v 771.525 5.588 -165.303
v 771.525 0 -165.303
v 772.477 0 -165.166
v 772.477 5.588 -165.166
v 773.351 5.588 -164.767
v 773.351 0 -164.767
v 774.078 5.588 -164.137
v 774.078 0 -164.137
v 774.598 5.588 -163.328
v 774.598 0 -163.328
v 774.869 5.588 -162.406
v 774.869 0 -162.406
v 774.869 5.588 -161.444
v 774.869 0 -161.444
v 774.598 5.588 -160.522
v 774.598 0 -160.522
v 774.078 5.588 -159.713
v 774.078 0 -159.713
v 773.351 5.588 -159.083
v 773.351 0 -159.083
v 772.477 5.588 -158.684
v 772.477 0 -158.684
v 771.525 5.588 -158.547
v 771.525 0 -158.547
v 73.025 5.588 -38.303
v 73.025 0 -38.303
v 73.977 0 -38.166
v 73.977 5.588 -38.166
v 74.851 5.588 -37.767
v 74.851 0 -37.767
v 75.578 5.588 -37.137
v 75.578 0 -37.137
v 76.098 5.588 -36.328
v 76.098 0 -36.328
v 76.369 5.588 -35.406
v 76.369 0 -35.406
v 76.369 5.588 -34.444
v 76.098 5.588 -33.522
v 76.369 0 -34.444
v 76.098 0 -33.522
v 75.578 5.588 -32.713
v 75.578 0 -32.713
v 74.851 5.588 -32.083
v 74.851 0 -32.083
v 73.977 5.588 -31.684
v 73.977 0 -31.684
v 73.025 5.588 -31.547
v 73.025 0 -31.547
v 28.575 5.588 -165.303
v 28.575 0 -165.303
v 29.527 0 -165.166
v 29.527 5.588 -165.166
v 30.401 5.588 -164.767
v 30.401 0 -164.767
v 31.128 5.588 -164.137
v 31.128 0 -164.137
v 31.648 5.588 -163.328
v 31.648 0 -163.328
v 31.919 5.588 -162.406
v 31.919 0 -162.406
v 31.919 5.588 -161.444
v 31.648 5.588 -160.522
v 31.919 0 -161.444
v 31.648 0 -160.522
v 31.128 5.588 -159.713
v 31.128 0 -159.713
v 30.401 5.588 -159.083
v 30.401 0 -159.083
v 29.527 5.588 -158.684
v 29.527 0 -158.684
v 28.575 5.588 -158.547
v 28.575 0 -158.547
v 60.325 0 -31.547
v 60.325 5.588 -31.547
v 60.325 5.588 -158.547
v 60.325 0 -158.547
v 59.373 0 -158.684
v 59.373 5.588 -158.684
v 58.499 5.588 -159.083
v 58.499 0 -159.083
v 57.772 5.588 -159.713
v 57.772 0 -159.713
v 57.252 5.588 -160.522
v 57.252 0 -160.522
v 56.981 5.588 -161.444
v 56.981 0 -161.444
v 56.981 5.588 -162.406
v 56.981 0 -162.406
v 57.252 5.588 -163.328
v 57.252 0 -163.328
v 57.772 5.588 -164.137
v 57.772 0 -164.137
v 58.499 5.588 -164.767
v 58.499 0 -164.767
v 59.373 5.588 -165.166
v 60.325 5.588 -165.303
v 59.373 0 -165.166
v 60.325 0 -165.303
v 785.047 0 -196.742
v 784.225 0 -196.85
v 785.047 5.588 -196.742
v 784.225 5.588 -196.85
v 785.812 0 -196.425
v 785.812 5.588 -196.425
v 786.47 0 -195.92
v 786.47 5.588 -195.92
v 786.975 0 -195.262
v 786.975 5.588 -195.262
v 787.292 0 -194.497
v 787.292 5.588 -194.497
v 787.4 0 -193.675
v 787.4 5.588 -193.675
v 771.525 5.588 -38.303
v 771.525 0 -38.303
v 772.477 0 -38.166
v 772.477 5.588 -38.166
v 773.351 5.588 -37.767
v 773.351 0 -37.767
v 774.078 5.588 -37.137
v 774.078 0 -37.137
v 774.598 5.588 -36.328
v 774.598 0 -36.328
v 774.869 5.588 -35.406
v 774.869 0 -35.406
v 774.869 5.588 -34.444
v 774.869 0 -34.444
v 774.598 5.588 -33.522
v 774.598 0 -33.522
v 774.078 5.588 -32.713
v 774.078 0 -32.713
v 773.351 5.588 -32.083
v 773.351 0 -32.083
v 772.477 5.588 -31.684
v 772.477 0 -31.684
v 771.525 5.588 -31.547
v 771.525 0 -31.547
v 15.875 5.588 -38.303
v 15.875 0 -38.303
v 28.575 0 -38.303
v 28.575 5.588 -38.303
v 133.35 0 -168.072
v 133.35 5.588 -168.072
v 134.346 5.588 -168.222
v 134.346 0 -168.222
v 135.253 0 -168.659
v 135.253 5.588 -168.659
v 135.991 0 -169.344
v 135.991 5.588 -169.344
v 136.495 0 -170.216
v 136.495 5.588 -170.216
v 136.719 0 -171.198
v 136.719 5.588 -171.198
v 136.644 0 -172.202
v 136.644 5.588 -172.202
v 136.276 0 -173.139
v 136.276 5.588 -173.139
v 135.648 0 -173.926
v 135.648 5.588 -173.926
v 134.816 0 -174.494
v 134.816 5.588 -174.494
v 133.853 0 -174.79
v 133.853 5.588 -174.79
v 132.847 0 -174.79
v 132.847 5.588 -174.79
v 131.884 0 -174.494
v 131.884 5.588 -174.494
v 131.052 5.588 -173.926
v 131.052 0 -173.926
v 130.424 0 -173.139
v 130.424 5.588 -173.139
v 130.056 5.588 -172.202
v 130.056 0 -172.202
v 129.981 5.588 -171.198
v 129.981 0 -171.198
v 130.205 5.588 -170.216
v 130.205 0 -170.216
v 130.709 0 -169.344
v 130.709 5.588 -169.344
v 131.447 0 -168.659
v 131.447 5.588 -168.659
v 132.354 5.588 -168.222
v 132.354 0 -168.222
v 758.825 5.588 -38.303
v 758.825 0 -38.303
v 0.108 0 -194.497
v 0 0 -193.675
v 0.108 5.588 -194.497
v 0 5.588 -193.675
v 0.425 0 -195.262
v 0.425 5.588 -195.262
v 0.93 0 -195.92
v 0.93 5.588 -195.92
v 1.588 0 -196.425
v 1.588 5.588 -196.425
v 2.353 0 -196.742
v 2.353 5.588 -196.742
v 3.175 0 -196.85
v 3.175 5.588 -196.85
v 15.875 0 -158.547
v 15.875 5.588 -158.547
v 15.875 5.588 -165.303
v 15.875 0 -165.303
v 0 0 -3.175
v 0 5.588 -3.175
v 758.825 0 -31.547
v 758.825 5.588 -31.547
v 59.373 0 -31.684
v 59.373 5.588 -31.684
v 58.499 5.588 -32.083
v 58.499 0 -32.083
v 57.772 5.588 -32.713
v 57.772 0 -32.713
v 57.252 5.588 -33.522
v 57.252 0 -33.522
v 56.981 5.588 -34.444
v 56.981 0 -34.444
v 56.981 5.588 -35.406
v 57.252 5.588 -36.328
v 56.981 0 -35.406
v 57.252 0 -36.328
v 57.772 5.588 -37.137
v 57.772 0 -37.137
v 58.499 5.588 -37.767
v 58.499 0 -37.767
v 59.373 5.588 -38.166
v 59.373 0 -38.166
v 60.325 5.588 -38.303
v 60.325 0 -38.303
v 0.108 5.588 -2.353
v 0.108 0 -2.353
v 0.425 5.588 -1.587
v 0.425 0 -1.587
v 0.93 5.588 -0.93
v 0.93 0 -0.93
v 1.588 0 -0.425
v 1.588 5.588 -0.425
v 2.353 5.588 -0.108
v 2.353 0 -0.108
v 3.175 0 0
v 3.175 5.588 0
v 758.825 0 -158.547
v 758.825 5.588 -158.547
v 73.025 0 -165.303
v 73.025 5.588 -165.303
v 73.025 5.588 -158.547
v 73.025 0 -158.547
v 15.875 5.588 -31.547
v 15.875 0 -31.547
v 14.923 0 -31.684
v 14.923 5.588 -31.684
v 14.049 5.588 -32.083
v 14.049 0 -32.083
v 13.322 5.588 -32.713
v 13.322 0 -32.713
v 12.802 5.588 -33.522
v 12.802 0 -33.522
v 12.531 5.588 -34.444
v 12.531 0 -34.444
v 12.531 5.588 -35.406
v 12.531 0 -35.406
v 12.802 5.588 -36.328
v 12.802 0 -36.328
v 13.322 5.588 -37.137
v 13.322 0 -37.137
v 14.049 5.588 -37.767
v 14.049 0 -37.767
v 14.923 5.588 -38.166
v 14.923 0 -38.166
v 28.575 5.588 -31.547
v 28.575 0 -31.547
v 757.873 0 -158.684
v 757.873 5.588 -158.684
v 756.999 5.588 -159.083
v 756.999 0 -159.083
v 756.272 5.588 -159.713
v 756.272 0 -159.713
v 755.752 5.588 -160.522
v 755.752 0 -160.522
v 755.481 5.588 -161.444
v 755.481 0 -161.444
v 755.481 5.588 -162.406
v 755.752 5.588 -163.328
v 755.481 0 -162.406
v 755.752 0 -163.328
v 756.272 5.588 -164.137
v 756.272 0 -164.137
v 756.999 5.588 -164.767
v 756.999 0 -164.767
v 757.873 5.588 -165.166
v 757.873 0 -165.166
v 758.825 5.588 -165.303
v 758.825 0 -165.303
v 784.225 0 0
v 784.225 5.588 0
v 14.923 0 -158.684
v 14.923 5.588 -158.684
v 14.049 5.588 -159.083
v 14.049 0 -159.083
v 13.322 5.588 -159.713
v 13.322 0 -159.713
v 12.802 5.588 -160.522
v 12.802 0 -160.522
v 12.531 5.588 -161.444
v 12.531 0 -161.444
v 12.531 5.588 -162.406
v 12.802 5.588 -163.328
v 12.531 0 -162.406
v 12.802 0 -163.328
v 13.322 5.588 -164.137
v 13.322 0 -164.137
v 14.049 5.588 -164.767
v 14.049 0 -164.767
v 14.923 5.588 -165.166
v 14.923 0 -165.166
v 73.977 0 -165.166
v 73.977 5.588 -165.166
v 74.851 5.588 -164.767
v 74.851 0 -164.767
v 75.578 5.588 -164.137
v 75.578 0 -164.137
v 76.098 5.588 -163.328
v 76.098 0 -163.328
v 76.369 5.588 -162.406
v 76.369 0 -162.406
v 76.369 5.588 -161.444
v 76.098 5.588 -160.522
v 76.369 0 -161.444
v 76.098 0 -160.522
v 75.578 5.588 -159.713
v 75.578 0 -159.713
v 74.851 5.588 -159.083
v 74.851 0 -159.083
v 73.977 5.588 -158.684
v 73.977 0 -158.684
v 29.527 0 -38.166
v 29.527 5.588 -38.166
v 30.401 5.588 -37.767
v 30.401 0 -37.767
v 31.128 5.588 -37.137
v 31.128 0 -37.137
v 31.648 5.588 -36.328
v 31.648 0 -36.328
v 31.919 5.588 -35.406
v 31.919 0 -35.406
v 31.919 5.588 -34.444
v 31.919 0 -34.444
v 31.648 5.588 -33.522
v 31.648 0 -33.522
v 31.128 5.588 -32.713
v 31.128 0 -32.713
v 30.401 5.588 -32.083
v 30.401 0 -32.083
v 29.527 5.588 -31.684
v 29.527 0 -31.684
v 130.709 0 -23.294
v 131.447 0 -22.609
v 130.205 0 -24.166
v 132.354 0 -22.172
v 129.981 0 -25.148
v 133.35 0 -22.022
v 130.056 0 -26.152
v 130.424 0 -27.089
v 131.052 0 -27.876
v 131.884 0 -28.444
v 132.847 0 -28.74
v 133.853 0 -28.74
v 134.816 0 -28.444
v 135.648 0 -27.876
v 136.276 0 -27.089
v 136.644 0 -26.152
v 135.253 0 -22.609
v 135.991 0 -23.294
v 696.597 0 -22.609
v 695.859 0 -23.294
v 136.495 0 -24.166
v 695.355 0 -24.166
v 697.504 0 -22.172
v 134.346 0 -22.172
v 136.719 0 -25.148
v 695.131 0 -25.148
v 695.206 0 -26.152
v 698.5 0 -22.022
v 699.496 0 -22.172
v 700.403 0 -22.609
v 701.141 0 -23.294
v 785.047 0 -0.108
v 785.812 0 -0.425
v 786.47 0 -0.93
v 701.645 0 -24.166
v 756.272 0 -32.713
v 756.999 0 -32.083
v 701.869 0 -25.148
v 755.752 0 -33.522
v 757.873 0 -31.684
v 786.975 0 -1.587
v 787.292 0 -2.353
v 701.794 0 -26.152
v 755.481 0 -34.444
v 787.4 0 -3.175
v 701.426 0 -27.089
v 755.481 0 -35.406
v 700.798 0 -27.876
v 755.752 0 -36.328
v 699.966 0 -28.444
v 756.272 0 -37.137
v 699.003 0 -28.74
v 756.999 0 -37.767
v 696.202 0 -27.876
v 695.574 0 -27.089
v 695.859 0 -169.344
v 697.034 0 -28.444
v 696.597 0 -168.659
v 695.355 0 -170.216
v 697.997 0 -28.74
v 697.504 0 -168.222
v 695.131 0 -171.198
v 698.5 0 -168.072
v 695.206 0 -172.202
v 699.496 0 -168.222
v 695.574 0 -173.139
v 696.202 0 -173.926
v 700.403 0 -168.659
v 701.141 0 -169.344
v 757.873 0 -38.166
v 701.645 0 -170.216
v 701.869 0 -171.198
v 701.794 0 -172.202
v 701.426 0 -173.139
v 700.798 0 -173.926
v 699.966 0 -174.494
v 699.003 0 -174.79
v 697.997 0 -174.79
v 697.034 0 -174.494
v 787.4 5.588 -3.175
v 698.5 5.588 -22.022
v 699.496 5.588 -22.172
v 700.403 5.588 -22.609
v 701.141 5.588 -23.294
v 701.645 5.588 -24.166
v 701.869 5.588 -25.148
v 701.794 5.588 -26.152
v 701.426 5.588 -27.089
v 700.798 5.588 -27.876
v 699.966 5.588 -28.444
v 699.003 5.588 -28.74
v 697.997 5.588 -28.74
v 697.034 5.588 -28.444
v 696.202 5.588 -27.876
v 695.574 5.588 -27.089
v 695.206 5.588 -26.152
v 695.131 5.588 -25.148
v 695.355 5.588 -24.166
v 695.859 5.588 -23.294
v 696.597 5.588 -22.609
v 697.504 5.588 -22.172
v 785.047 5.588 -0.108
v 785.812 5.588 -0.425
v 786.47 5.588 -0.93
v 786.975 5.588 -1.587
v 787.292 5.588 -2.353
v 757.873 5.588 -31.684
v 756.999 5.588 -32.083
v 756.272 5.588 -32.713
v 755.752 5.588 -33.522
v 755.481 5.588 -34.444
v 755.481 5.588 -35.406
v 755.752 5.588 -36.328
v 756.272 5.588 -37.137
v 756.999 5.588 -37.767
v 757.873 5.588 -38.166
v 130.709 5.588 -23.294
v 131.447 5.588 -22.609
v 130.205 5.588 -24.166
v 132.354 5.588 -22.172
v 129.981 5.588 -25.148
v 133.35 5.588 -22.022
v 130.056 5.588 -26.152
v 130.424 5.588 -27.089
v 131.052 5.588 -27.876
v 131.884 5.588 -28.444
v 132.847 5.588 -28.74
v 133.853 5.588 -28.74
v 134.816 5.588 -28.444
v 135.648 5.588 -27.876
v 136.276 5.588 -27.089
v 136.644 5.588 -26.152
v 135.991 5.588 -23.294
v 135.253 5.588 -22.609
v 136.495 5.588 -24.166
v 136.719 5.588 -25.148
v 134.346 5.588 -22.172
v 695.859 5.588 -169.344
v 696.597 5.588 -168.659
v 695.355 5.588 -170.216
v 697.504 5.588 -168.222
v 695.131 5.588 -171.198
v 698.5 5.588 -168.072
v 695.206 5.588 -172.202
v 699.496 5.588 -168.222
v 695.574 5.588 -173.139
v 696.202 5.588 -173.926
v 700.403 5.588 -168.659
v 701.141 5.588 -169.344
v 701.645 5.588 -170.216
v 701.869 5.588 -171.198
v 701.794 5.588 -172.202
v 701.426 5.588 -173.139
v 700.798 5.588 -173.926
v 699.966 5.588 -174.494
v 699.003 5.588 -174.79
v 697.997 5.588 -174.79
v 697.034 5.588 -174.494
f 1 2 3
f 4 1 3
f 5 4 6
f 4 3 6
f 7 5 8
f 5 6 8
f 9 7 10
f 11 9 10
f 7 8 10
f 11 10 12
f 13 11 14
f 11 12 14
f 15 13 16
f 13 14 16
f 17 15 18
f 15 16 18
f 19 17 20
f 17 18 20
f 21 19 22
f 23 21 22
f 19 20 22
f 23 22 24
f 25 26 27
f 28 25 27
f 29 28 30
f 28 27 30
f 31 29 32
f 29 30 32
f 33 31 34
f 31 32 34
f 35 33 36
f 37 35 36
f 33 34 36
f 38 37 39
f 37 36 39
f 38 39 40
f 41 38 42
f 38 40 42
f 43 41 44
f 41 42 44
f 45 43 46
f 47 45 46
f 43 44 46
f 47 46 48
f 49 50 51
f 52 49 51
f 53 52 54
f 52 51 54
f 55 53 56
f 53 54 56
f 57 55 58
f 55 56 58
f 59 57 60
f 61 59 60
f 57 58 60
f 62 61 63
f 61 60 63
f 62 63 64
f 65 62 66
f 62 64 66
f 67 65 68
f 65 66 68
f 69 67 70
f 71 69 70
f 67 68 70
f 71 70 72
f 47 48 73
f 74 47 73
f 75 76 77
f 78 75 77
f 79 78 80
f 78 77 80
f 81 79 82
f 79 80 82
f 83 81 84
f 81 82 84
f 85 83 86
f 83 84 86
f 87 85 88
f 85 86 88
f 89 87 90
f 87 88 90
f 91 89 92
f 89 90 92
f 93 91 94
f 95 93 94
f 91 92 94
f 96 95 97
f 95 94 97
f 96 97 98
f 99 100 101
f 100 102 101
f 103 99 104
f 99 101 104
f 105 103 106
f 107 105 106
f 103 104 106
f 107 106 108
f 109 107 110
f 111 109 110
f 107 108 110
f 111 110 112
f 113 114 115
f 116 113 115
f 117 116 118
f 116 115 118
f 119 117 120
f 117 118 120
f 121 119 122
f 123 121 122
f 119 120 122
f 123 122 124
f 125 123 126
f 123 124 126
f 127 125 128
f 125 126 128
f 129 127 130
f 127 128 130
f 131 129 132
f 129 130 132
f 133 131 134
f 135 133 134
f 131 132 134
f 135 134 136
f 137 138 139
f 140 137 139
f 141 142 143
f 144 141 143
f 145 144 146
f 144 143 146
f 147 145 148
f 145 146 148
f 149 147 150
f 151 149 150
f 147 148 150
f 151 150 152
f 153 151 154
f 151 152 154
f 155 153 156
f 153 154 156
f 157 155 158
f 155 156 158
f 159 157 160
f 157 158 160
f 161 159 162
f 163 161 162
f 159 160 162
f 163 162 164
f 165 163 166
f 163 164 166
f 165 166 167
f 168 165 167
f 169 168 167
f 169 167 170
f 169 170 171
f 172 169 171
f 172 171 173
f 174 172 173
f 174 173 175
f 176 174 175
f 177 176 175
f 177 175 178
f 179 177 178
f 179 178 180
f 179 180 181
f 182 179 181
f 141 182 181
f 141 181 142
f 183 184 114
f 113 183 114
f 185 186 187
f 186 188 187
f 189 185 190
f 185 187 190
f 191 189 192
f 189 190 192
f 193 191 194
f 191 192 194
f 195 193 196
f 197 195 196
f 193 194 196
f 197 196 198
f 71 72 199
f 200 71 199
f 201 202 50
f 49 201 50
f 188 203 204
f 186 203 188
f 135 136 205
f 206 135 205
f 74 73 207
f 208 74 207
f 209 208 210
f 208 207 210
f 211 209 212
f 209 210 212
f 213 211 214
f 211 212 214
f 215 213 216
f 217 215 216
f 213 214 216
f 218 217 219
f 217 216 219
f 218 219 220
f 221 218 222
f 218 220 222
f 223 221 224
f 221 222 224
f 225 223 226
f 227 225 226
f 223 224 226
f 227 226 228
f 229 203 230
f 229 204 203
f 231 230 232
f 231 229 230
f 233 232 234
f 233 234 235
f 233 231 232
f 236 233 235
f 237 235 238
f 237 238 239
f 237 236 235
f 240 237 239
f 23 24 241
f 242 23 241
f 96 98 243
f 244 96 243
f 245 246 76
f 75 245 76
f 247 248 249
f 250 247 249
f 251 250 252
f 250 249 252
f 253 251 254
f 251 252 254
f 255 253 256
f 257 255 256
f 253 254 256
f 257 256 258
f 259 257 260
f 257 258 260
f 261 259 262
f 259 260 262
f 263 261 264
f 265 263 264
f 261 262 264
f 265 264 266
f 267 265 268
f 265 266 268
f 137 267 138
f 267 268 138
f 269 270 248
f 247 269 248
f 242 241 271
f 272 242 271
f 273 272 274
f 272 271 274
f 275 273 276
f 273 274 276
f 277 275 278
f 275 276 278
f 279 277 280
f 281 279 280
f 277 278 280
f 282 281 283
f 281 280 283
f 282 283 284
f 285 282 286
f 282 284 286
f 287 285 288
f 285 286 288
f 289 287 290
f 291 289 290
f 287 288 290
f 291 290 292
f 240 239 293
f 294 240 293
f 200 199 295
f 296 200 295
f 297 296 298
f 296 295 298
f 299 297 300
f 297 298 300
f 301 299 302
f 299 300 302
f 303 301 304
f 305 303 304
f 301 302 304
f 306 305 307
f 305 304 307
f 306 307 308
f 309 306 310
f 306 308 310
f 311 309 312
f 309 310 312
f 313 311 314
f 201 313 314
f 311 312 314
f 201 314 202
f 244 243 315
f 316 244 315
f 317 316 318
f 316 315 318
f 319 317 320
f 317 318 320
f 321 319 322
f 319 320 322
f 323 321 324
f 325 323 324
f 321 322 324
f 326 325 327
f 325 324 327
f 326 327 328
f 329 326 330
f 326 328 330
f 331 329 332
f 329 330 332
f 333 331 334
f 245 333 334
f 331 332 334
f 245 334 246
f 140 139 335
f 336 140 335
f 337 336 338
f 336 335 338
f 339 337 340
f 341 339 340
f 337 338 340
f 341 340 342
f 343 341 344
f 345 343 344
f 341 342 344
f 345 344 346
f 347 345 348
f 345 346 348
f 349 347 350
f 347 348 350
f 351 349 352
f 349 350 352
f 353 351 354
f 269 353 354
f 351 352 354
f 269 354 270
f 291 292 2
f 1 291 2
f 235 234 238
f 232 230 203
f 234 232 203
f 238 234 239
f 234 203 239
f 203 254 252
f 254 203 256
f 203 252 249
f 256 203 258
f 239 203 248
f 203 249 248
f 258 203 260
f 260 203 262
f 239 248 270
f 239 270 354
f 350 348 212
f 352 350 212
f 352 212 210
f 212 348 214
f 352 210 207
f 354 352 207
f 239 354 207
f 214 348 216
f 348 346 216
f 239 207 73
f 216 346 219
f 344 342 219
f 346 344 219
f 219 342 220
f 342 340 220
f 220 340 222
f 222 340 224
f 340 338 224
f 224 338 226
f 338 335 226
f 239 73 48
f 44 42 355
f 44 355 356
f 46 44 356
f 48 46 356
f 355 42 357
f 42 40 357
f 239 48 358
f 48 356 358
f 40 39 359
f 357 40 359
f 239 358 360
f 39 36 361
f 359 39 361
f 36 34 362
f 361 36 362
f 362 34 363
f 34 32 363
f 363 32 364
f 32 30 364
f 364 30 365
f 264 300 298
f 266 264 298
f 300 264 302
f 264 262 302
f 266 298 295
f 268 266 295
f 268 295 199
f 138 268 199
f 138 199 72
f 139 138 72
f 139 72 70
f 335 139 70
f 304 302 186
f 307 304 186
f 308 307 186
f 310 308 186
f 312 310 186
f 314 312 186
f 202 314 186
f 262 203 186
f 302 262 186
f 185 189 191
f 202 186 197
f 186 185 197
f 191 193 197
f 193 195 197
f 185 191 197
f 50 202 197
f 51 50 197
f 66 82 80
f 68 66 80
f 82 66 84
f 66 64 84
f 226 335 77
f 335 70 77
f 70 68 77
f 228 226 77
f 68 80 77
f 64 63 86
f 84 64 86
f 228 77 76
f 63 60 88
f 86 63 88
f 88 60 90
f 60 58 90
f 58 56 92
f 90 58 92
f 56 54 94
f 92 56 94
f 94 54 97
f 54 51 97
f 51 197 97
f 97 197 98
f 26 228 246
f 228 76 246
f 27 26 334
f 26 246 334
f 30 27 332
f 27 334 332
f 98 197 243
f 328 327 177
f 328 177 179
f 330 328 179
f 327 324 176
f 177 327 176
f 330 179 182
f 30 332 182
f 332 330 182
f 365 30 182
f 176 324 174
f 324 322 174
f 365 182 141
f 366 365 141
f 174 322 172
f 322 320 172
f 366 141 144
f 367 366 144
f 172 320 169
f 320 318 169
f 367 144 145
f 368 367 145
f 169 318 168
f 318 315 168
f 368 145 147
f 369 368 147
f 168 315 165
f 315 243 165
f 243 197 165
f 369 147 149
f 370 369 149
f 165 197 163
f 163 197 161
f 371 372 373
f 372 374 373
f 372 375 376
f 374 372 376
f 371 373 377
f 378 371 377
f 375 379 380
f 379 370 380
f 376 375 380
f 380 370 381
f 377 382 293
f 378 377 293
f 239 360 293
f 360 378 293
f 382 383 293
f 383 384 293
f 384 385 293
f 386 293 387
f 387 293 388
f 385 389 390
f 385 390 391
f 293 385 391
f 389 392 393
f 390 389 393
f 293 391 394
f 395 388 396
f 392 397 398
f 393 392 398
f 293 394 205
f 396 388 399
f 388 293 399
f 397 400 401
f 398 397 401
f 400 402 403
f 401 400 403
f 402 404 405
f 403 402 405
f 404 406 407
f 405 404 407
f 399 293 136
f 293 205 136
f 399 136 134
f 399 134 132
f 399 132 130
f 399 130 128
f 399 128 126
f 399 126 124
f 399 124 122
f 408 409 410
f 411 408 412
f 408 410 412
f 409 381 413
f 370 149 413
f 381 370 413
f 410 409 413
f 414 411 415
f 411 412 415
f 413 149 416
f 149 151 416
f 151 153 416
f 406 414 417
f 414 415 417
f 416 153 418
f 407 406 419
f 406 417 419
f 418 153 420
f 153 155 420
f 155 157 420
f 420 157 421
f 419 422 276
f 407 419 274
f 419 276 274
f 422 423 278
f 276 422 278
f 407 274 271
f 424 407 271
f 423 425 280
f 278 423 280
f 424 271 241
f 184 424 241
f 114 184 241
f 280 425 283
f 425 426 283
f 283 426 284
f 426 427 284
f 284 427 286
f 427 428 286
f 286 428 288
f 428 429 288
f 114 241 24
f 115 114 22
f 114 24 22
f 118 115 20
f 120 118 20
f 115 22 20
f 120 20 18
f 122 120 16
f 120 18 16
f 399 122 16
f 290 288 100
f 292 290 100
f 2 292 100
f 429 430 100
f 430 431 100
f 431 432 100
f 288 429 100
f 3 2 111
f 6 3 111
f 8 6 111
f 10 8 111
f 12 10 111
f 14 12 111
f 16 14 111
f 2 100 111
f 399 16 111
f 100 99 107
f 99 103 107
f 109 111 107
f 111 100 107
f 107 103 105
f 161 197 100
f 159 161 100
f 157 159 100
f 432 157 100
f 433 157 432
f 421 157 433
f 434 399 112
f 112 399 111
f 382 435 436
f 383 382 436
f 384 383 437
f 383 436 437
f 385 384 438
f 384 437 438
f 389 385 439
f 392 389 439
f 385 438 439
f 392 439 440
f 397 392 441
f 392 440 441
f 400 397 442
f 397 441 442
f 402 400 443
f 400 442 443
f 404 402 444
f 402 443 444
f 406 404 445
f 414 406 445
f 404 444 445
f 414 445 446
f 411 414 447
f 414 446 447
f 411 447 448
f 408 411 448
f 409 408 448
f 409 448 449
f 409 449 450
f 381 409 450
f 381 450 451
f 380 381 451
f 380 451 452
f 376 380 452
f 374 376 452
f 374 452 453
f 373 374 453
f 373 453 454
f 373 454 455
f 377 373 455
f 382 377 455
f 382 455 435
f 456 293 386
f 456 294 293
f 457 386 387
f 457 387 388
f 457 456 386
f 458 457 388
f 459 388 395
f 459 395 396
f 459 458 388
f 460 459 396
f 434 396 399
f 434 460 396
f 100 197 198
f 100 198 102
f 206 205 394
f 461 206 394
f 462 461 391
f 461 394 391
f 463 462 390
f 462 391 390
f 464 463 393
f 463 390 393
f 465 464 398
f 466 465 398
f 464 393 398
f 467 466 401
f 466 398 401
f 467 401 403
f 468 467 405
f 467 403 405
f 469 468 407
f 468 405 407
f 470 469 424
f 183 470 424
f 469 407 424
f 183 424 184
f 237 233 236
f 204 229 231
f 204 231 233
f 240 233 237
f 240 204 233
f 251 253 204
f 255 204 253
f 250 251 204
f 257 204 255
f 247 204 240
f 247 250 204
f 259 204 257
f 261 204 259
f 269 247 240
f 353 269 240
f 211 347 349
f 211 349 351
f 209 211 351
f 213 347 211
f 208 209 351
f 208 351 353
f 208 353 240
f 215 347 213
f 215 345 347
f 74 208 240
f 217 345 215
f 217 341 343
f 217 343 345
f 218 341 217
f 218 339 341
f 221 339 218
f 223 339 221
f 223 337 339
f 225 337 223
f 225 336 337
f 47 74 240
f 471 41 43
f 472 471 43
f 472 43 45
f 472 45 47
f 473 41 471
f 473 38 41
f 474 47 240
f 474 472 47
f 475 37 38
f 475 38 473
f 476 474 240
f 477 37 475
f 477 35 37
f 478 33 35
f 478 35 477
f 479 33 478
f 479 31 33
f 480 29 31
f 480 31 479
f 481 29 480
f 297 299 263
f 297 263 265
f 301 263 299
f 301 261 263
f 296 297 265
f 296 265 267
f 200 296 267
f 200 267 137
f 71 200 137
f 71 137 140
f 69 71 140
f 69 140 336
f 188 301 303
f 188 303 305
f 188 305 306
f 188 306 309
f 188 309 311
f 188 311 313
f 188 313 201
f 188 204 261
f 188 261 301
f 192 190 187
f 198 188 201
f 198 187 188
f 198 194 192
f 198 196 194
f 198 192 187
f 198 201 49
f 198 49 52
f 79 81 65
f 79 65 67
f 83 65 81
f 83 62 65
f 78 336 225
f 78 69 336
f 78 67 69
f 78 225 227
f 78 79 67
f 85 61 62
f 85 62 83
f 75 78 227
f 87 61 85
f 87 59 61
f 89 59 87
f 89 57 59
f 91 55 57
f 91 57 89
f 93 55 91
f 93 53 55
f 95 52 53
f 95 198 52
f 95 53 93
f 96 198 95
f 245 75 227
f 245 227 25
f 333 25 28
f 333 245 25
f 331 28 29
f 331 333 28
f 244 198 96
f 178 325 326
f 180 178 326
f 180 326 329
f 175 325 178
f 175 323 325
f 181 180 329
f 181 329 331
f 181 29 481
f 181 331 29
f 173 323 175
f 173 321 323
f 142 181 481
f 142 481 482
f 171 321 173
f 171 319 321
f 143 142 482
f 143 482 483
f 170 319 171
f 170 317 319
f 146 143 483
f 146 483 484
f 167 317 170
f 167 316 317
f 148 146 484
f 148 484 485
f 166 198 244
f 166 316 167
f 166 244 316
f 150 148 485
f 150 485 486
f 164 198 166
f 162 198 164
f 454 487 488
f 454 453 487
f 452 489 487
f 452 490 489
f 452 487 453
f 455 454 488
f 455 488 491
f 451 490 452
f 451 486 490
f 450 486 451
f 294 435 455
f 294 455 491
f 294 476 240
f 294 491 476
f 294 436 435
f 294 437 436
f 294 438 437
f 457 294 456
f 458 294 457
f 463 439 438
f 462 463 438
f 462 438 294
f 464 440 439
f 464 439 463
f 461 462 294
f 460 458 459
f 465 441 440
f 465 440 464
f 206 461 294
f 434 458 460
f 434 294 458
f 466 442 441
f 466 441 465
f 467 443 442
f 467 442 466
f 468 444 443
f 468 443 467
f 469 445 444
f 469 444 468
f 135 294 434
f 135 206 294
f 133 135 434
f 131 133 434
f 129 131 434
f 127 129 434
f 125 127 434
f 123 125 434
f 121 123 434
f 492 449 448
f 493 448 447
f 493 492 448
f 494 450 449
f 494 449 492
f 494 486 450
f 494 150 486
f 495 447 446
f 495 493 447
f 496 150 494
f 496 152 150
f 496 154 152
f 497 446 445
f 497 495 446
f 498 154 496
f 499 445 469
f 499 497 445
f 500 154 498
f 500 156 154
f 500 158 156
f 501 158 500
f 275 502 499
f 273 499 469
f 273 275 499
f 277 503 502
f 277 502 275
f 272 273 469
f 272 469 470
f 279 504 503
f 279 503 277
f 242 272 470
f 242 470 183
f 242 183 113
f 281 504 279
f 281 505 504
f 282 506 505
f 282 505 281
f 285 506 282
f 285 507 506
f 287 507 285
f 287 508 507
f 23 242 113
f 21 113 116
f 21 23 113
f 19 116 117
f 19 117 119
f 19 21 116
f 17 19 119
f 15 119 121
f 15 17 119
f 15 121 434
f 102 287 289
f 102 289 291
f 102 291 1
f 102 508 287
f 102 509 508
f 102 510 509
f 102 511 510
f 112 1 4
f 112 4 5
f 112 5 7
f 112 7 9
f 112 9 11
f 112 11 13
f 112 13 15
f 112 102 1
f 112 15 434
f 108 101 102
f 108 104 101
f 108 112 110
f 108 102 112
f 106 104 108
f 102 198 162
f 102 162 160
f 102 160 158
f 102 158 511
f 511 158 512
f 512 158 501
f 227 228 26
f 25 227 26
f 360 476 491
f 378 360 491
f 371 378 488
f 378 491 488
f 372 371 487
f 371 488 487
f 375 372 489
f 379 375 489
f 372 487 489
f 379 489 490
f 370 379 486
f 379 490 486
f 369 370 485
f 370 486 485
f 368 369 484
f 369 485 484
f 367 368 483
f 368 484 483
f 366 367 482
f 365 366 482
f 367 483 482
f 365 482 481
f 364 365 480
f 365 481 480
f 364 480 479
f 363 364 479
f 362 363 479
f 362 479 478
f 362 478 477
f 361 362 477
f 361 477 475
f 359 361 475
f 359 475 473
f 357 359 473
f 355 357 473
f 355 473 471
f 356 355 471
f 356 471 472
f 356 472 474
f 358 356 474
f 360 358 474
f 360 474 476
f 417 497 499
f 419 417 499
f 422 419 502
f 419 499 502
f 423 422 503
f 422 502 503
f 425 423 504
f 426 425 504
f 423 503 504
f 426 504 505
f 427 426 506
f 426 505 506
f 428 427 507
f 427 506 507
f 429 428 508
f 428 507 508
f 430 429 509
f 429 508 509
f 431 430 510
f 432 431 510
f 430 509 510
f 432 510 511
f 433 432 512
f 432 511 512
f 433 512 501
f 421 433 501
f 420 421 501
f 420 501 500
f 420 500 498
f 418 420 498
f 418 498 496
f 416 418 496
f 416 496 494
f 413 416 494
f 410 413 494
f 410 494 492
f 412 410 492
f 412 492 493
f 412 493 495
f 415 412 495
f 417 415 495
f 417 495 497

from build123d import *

# Parameters (mm, degrees)
SKETCH1_W           = 787.4
SKETCH1_H           = 196.85
BOSS_EXTRUDE1_DEPTH = 5.588
FILLET1_R           = 3.175
SKETCH2_R           = 3.3782
CUT_EXTRUDE1_DEPTH  = 812.652578536


with BuildPart() as part:
    # Sketch1 → Boss-Extrude1 (new body)
    with BuildSketch(Plane(origin=(0, 0, 0), x_dir=(1, 0, 0), z_dir=(0, 1, 0))):
        with Locations((393.7, 98.425)):
            Rectangle(SKETCH1_W, SKETCH1_H)
        with BuildLine():
            Line((15.875, 38.3032), (28.575, 38.3032))
            ThreePointArc((28.575, 38.3032), (31.9532, 34.925), (28.575, 31.5468))
            Line((28.575, 31.5468), (15.875, 31.5468))
            ThreePointArc((15.875, 31.5468), (12.4968, 34.925), (15.875, 38.3032))
        make_face(mode=Mode.SUBTRACT)
        with BuildLine():
            Line((15.875, 165.3032), (28.575, 165.3032))
            ThreePointArc((28.575, 165.3032), (31.9532, 161.925), (28.575, 158.5468))
            Line((28.575, 158.5468), (15.875, 158.5468))
            ThreePointArc((15.875, 158.5468), (12.4968, 161.925), (15.875, 165.3032))
        make_face(mode=Mode.SUBTRACT)
        with BuildLine():
            Line((60.325, 165.3032), (73.025, 165.3032))
            ThreePointArc((73.025, 165.3032), (76.4032, 161.925), (73.025, 158.5468))
            Line((73.025, 158.5468), (60.325, 158.5468))
            ThreePointArc((60.325, 158.5468), (56.9468, 161.925), (60.325, 165.3032))
        make_face(mode=Mode.SUBTRACT)
        with BuildLine():
            Line((60.325, 38.3032), (73.025, 38.3032))
            ThreePointArc((73.025, 38.3032), (76.4032, 34.925), (73.025, 31.5468))
            Line((73.025, 31.5468), (60.325, 31.5468))
            ThreePointArc((60.325, 31.5468), (56.9468, 34.925), (60.325, 38.3032))
        make_face(mode=Mode.SUBTRACT)
        with BuildLine():
            Line((771.525, 158.5468), (758.825, 158.5468))
            ThreePointArc((758.825, 158.5468), (755.4468, 161.925), (758.825, 165.3032))
            Line((758.825, 165.3032), (771.525, 165.3032))
            ThreePointArc((771.525, 165.3032), (774.9032, 161.925), (771.525, 158.5468))
        make_face(mode=Mode.SUBTRACT)
        with BuildLine():
            Line((771.525, 31.5468), (758.825, 31.5468))
            ThreePointArc((758.825, 31.5468), (755.4468, 34.925), (758.825, 38.3032))
            Line((758.825, 38.3032), (771.525, 38.3032))
            ThreePointArc((771.525, 38.3032), (774.9032, 34.925), (771.525, 31.5468))
        make_face(mode=Mode.SUBTRACT)
    extrude(amount=BOSS_EXTRUDE1_DEPTH)

    # Fillet1
    fillet1_edges = [part.edges().sort_by_distance(p)[0] for p in [
        (0, 2.794, -196.85),
        (787.4, 2.794, -196.85),
        (787.4, 2.794, 0),
        (0, 2.794, 0),
    ]]
    fillet(fillet1_edges, radius=FILLET1_R)

    # Sketch2 → Cut-Extrude1 (cut, through all)
    with BuildSketch(Plane(origin=(0, 5.588, 0), x_dir=(1, 0, 0), z_dir=(0, 1, 0))):
        with Locations(Location((133.35, 171.45, 0), (0, 0, 270))):
            Circle(SKETCH2_R)
        with Locations(Location((133.35, 25.4, 0), (0, 0, 270))):
            Circle(SKETCH2_R)
        with Locations(Location((698.5, 25.4, 0), (0, 0, 270))):
            Circle(SKETCH2_R)
        with Locations(Location((698.5, 171.45, 0), (0, 0, 270))):
            Circle(SKETCH2_R)
    extrude(amount=-CUT_EXTRUDE1_DEPTH, mode=Mode.SUBTRACT)


solid = part.part
